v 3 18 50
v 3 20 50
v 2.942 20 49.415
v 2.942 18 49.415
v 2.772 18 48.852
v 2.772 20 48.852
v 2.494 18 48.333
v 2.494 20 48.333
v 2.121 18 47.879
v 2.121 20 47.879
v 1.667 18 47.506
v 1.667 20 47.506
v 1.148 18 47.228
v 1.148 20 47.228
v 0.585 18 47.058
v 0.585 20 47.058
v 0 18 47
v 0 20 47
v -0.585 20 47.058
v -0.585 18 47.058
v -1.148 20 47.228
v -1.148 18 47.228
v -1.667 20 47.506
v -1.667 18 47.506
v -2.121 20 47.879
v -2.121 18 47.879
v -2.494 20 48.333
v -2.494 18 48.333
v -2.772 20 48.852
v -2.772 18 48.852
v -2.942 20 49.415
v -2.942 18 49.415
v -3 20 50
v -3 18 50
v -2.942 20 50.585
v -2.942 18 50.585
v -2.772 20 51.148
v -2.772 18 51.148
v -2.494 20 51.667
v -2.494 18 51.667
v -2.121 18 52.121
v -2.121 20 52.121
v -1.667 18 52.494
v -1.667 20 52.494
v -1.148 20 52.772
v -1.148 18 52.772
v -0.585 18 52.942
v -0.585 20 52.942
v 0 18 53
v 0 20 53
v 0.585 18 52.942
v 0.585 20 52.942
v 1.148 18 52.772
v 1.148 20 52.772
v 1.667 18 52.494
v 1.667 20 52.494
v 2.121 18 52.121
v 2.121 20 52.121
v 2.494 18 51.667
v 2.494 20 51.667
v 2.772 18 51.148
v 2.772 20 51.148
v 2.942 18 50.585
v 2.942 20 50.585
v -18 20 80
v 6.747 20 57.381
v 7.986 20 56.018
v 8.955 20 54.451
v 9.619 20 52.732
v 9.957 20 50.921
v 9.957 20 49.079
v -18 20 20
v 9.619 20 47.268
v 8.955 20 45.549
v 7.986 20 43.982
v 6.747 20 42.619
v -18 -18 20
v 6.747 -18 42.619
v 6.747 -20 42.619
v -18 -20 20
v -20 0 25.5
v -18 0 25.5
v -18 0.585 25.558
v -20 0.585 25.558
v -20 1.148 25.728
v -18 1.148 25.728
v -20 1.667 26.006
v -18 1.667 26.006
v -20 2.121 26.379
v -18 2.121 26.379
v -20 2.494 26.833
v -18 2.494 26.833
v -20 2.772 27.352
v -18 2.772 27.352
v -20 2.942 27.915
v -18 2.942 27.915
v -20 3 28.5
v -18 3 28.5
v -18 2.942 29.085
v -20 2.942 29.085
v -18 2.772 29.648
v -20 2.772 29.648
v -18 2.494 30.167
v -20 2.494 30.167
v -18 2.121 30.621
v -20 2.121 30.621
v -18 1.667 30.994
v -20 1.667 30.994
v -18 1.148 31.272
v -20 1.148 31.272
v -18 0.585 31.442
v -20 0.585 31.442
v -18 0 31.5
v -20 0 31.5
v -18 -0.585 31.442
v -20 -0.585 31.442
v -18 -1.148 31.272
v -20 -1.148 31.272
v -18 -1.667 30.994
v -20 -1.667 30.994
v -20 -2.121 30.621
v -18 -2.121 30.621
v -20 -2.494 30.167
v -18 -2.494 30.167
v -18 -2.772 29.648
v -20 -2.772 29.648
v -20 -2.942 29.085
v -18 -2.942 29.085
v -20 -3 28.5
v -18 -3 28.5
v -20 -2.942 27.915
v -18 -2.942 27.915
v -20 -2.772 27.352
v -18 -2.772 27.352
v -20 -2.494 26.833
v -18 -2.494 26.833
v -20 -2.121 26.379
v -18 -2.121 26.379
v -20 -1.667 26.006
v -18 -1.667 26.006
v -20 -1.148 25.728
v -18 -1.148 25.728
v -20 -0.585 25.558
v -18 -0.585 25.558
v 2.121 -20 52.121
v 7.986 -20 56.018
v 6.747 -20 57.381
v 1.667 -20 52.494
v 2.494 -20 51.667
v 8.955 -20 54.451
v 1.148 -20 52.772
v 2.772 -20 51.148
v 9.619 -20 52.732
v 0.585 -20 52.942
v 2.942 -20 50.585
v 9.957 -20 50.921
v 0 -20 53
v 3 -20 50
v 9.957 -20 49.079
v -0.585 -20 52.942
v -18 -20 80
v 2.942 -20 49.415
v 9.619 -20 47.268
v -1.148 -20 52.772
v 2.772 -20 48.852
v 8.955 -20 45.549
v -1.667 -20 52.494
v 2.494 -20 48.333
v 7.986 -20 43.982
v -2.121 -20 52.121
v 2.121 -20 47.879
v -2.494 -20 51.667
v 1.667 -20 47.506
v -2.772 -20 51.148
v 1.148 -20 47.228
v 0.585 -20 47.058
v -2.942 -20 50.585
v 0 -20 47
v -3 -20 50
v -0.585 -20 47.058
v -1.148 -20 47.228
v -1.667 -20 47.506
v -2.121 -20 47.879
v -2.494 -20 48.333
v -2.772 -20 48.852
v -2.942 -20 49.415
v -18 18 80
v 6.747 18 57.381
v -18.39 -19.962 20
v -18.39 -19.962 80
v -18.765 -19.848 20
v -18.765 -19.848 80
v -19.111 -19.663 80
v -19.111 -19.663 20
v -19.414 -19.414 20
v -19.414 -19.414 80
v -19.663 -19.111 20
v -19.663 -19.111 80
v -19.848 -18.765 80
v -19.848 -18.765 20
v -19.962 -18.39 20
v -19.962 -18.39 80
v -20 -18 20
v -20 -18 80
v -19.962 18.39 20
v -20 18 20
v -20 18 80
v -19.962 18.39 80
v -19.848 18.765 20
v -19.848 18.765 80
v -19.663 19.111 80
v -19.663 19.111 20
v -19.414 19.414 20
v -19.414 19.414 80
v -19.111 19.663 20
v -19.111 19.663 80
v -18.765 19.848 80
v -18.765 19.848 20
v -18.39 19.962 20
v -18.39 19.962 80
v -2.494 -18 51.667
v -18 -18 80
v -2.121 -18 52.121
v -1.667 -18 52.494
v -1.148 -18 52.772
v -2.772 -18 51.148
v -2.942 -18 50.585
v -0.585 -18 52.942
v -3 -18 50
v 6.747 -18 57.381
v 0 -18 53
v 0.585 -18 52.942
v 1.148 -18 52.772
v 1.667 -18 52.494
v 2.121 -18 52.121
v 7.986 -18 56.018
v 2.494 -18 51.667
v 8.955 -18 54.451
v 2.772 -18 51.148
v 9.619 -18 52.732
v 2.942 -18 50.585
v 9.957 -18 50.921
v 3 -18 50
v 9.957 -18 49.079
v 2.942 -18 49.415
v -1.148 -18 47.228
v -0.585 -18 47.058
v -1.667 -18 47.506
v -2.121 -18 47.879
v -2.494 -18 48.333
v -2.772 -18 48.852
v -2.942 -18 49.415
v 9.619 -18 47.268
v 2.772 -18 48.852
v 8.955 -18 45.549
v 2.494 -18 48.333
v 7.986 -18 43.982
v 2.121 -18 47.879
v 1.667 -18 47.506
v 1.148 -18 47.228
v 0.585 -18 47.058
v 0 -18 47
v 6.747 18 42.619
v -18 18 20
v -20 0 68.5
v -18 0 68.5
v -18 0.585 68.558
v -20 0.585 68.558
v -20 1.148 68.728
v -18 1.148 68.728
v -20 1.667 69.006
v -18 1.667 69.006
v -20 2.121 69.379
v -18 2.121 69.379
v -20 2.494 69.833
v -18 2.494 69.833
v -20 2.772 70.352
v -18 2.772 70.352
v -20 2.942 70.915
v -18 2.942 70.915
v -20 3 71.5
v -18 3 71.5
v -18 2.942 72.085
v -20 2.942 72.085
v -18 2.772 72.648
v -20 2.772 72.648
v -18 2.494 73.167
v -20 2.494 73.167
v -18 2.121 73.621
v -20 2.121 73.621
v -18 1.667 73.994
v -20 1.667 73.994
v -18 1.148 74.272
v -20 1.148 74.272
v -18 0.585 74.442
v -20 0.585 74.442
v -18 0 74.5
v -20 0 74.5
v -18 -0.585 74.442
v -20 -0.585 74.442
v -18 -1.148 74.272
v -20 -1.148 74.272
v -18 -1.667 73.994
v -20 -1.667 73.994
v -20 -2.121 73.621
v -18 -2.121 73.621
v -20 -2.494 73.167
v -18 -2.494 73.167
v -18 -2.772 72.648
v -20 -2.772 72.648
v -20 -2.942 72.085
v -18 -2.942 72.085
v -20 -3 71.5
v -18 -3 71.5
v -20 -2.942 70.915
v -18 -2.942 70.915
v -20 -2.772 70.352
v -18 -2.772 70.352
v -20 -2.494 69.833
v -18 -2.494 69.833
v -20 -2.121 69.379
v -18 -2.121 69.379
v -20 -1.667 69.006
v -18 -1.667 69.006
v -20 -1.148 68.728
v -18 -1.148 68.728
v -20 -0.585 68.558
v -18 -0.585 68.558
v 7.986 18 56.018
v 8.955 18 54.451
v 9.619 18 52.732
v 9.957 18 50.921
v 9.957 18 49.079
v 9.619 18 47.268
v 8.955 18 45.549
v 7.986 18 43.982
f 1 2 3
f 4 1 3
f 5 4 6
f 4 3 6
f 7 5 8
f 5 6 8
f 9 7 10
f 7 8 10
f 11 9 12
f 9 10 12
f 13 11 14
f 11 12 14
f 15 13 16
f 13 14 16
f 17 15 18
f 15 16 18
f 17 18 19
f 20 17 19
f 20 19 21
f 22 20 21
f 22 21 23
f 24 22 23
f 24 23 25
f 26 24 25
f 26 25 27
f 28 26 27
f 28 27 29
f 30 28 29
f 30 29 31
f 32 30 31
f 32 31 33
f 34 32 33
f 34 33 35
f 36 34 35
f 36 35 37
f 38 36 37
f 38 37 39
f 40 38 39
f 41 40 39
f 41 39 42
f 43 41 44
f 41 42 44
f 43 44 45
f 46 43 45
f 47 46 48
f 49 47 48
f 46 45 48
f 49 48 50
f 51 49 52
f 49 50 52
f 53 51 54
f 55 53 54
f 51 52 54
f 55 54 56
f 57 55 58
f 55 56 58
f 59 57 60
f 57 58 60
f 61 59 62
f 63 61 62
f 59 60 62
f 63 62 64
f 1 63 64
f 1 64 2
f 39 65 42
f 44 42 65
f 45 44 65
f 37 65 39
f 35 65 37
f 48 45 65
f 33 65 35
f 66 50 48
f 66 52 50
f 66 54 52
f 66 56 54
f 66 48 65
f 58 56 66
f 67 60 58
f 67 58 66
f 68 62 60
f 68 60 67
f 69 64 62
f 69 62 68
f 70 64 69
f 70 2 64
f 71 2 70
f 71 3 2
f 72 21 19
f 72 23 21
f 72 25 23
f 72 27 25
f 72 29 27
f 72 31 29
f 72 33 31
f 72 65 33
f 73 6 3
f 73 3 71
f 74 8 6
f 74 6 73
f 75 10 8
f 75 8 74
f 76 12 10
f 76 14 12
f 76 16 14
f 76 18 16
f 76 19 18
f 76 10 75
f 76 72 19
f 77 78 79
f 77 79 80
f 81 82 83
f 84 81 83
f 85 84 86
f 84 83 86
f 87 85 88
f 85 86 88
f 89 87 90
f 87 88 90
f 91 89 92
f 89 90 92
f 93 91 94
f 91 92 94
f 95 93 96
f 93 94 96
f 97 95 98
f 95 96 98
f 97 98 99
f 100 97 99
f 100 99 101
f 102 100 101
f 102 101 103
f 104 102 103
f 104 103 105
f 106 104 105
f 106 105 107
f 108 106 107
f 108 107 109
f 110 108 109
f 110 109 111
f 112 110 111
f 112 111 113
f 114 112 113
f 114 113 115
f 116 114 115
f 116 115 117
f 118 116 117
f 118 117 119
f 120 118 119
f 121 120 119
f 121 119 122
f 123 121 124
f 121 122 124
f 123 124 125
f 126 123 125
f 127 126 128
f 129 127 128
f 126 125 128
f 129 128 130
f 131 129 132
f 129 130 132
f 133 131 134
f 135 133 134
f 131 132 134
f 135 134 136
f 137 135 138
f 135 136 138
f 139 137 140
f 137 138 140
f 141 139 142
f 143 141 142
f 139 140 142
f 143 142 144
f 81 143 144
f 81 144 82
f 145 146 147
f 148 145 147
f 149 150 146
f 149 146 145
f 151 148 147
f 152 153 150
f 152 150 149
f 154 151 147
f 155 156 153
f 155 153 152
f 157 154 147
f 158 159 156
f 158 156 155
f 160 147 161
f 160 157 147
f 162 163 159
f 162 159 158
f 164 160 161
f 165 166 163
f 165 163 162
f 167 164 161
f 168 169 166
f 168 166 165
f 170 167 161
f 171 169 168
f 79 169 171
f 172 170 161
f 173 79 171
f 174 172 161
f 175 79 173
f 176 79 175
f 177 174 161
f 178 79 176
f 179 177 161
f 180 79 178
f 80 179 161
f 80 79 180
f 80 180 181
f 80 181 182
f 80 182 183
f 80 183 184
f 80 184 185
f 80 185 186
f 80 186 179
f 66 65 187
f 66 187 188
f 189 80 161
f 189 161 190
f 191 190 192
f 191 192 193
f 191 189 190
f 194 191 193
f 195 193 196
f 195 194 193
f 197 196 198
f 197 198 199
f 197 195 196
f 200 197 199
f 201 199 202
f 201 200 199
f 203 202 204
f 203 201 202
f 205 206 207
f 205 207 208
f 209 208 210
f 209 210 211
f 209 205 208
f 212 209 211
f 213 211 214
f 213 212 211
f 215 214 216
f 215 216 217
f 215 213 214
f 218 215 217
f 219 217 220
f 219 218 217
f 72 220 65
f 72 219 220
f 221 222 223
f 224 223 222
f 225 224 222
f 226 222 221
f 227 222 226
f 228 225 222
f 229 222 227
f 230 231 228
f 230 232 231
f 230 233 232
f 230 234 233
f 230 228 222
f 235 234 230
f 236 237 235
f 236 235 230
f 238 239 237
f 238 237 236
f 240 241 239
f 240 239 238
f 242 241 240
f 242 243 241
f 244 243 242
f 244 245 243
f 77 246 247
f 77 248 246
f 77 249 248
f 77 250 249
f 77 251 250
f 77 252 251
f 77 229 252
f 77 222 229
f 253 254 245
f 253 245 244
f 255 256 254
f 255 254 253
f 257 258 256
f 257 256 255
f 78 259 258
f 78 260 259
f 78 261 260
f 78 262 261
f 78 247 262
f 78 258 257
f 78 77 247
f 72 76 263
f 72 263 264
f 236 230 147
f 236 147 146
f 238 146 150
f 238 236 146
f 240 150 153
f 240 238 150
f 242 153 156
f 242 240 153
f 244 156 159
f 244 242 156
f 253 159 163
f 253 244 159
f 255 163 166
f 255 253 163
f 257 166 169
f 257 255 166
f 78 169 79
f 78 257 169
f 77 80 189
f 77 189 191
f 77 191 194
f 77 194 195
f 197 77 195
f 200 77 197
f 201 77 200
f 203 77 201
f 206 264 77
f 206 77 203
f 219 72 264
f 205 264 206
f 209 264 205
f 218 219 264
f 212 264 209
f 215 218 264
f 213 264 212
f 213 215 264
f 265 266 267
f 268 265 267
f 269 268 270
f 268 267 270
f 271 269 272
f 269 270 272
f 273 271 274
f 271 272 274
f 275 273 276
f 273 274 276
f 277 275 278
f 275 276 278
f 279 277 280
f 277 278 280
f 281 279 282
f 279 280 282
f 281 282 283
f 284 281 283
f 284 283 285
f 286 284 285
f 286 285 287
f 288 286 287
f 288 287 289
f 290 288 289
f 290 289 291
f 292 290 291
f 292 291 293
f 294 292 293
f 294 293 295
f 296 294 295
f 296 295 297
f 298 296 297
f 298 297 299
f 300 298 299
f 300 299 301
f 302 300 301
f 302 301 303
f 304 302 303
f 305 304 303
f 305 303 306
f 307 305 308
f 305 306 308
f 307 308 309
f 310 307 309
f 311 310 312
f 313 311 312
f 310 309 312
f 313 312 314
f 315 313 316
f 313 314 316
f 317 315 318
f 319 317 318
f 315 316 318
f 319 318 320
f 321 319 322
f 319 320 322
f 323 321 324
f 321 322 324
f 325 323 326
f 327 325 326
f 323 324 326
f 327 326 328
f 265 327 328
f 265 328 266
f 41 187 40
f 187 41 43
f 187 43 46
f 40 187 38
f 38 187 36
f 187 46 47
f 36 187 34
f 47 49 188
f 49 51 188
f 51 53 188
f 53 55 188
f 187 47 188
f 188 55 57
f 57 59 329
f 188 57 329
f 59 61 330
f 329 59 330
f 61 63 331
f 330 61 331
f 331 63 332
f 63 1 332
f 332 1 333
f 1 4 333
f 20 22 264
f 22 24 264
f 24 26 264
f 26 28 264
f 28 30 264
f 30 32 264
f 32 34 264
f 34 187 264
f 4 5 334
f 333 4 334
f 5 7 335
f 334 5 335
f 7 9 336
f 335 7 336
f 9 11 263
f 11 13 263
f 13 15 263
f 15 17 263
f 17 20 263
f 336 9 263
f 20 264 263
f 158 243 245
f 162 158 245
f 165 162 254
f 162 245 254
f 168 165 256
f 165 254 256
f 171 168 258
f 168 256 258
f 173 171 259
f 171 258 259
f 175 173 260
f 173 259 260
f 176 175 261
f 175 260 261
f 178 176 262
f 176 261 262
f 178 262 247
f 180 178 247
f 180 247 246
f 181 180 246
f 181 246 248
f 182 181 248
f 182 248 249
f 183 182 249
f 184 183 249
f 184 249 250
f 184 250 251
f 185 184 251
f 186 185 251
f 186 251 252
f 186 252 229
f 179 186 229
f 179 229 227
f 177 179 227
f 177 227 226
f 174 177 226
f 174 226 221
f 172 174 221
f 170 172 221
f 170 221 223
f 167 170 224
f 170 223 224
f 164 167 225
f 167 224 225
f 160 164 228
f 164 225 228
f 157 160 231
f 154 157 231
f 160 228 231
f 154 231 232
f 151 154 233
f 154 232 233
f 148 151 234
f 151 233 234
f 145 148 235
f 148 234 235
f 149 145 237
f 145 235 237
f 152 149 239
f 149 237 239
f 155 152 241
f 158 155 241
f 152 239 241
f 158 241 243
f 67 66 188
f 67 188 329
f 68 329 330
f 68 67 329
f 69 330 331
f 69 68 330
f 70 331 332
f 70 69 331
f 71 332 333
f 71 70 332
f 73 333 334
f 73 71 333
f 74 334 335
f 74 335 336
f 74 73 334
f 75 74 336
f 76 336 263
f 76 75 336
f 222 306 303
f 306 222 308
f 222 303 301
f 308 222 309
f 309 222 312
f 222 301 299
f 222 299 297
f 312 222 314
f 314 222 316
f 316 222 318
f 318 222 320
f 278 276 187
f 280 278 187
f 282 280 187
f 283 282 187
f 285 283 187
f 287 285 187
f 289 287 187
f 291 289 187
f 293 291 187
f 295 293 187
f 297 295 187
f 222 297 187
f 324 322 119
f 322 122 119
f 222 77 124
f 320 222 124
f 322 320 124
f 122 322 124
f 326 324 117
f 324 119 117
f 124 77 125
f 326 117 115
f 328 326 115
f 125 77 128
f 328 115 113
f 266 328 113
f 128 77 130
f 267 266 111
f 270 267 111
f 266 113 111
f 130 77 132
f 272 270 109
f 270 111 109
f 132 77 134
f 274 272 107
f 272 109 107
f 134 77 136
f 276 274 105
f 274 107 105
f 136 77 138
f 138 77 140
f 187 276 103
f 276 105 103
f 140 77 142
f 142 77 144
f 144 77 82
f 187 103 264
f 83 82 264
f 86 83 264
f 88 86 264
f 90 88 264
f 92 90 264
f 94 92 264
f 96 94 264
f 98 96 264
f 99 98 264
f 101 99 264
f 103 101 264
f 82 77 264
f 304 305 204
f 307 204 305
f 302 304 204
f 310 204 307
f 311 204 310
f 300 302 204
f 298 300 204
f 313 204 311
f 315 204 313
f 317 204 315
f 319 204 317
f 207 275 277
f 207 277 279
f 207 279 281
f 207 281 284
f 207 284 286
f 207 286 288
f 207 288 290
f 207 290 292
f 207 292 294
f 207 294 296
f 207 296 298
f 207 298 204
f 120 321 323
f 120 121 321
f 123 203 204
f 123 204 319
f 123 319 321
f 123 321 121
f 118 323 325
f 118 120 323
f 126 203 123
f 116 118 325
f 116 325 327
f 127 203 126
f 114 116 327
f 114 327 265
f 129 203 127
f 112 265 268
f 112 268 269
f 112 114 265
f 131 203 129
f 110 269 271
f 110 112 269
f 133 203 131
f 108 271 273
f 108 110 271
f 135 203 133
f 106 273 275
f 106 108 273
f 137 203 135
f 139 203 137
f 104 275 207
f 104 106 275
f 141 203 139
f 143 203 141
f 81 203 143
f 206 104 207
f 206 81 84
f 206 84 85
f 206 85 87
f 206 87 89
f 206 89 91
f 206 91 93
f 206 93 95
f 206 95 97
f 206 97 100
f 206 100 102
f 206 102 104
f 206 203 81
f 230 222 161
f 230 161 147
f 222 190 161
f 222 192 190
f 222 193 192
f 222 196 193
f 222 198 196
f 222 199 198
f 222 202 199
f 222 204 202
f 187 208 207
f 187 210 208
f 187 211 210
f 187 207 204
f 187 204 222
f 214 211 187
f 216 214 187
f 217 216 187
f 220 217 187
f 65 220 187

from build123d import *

# Parameters (mm, degrees)
SKETCH_1_W               = 36
SKETCH_1_H               = 36
EXTRUDE_1_DEPTH          = 100
SKETCH_2_R               = 3
CUT_EXTRUDE_1_DEPTH      = 1
CUT_EXTRUDE_1_DEPTH_BACK = 41
SKETCH_3_OUTSIDE_W       = 64.978
SKETCH_3_OUTSIDE_H       = 124.978
CUT_EXTRUDE_2_DEPTH      = 1
CUT_EXTRUDE_2_DEPTH_BACK = 41
SKETCH_4_R               = 3
CUT_EXTRUDE_3_DEPTH      = 29
CUT_EXTRUDE_3_DEPTH_BACK = 3


with BuildPart() as part:
    # Эскиз1 → Бобышка-Вытянуть1 (new body)
    with BuildSketch(Plane.XY):
        with BuildLine():
            Line((-18, 20), (18, 20))
            ThreePointArc((18, 20), (19.414213562, 19.414213562), (20, 18))
            Line((20, 18), (20, -18))
            ThreePointArc((20, -18), (19.414213562, -19.414213562), (18, -20))
            Line((18, -20), (-18, -20))
            ThreePointArc((-18, -20), (-19.414213562, -19.414213562), (-20, -18))
            Line((-20, -18), (-20, 18))
            ThreePointArc((-20, 18), (-19.414213562, 19.414213562), (-18, 20))
        make_face()
        Rectangle(SKETCH_1_W, SKETCH_1_H, mode=Mode.SUBTRACT)
    extrude(amount=EXTRUDE_1_DEPTH)

    # Эскиз2 → Вырез-Вытянуть1 (cut, two sides)
    with BuildSketch(Plane(origin=(0, 20, 0), x_dir=(1, 0, 0), z_dir=(0, 1, 0))) as cut_extrude_1_sk:
        with Locations((0, -50)):
            Circle(SKETCH_2_R)
    extrude(amount=CUT_EXTRUDE_1_DEPTH, mode=Mode.SUBTRACT)
    extrude(cut_extrude_1_sk.sketch, amount=-CUT_EXTRUDE_1_DEPTH_BACK, mode=Mode.SUBTRACT)

    # Эскиз3 outside → Вырез-Вытянуть2 (cut, two sides)
    with BuildSketch(Plane(origin=(0, 20, 0), x_dir=(1, 0, 0), z_dir=(0, 1, 0))) as cut_extrude_2_sk:
        with Locations((0, -50)):
            Rectangle(SKETCH_3_OUTSIDE_W, SKETCH_3_OUTSIDE_H)
        with BuildLine():
            Line((6.746595399, -42.618709427), (-18, -20))
            Line((-18, -20), (-21.837410107, -20))
            Line((-21.837410107, -20), (-21.837410107, -80))
            Line((-21.837410107, -80), (-18, -80))
            Line((-18, -80), (6.746595399, -57.381290573))
            ThreePointArc((6.746595399, -57.381290573), (10, -50), (6.746595399, -42.618709427))
        make_face(mode=Mode.SUBTRACT)
    extrude(amount=CUT_EXTRUDE_2_DEPTH, mode=Mode.SUBTRACT)
    extrude(cut_extrude_2_sk.sketch, amount=-CUT_EXTRUDE_2_DEPTH_BACK, mode=Mode.SUBTRACT)

    # Эскиз4 → Вырез-Вытянуть3 (cut, two sides)
    with BuildSketch(Plane(origin=(-18, 0, 0), x_dir=(0, 0, -1), z_dir=(1, 0, 0))) as cut_extrude_3_sk:
        with Locations((-71.5, 0)):
            Circle(SKETCH_4_R)
        with Locations((-28.5, 0)):
            Circle(SKETCH_4_R)
    extrude(amount=CUT_EXTRUDE_3_DEPTH, mode=Mode.SUBTRACT)
    extrude(cut_extrude_3_sk.sketch, amount=-CUT_EXTRUDE_3_DEPTH_BACK, mode=Mode.SUBTRACT)


solid = part.part
